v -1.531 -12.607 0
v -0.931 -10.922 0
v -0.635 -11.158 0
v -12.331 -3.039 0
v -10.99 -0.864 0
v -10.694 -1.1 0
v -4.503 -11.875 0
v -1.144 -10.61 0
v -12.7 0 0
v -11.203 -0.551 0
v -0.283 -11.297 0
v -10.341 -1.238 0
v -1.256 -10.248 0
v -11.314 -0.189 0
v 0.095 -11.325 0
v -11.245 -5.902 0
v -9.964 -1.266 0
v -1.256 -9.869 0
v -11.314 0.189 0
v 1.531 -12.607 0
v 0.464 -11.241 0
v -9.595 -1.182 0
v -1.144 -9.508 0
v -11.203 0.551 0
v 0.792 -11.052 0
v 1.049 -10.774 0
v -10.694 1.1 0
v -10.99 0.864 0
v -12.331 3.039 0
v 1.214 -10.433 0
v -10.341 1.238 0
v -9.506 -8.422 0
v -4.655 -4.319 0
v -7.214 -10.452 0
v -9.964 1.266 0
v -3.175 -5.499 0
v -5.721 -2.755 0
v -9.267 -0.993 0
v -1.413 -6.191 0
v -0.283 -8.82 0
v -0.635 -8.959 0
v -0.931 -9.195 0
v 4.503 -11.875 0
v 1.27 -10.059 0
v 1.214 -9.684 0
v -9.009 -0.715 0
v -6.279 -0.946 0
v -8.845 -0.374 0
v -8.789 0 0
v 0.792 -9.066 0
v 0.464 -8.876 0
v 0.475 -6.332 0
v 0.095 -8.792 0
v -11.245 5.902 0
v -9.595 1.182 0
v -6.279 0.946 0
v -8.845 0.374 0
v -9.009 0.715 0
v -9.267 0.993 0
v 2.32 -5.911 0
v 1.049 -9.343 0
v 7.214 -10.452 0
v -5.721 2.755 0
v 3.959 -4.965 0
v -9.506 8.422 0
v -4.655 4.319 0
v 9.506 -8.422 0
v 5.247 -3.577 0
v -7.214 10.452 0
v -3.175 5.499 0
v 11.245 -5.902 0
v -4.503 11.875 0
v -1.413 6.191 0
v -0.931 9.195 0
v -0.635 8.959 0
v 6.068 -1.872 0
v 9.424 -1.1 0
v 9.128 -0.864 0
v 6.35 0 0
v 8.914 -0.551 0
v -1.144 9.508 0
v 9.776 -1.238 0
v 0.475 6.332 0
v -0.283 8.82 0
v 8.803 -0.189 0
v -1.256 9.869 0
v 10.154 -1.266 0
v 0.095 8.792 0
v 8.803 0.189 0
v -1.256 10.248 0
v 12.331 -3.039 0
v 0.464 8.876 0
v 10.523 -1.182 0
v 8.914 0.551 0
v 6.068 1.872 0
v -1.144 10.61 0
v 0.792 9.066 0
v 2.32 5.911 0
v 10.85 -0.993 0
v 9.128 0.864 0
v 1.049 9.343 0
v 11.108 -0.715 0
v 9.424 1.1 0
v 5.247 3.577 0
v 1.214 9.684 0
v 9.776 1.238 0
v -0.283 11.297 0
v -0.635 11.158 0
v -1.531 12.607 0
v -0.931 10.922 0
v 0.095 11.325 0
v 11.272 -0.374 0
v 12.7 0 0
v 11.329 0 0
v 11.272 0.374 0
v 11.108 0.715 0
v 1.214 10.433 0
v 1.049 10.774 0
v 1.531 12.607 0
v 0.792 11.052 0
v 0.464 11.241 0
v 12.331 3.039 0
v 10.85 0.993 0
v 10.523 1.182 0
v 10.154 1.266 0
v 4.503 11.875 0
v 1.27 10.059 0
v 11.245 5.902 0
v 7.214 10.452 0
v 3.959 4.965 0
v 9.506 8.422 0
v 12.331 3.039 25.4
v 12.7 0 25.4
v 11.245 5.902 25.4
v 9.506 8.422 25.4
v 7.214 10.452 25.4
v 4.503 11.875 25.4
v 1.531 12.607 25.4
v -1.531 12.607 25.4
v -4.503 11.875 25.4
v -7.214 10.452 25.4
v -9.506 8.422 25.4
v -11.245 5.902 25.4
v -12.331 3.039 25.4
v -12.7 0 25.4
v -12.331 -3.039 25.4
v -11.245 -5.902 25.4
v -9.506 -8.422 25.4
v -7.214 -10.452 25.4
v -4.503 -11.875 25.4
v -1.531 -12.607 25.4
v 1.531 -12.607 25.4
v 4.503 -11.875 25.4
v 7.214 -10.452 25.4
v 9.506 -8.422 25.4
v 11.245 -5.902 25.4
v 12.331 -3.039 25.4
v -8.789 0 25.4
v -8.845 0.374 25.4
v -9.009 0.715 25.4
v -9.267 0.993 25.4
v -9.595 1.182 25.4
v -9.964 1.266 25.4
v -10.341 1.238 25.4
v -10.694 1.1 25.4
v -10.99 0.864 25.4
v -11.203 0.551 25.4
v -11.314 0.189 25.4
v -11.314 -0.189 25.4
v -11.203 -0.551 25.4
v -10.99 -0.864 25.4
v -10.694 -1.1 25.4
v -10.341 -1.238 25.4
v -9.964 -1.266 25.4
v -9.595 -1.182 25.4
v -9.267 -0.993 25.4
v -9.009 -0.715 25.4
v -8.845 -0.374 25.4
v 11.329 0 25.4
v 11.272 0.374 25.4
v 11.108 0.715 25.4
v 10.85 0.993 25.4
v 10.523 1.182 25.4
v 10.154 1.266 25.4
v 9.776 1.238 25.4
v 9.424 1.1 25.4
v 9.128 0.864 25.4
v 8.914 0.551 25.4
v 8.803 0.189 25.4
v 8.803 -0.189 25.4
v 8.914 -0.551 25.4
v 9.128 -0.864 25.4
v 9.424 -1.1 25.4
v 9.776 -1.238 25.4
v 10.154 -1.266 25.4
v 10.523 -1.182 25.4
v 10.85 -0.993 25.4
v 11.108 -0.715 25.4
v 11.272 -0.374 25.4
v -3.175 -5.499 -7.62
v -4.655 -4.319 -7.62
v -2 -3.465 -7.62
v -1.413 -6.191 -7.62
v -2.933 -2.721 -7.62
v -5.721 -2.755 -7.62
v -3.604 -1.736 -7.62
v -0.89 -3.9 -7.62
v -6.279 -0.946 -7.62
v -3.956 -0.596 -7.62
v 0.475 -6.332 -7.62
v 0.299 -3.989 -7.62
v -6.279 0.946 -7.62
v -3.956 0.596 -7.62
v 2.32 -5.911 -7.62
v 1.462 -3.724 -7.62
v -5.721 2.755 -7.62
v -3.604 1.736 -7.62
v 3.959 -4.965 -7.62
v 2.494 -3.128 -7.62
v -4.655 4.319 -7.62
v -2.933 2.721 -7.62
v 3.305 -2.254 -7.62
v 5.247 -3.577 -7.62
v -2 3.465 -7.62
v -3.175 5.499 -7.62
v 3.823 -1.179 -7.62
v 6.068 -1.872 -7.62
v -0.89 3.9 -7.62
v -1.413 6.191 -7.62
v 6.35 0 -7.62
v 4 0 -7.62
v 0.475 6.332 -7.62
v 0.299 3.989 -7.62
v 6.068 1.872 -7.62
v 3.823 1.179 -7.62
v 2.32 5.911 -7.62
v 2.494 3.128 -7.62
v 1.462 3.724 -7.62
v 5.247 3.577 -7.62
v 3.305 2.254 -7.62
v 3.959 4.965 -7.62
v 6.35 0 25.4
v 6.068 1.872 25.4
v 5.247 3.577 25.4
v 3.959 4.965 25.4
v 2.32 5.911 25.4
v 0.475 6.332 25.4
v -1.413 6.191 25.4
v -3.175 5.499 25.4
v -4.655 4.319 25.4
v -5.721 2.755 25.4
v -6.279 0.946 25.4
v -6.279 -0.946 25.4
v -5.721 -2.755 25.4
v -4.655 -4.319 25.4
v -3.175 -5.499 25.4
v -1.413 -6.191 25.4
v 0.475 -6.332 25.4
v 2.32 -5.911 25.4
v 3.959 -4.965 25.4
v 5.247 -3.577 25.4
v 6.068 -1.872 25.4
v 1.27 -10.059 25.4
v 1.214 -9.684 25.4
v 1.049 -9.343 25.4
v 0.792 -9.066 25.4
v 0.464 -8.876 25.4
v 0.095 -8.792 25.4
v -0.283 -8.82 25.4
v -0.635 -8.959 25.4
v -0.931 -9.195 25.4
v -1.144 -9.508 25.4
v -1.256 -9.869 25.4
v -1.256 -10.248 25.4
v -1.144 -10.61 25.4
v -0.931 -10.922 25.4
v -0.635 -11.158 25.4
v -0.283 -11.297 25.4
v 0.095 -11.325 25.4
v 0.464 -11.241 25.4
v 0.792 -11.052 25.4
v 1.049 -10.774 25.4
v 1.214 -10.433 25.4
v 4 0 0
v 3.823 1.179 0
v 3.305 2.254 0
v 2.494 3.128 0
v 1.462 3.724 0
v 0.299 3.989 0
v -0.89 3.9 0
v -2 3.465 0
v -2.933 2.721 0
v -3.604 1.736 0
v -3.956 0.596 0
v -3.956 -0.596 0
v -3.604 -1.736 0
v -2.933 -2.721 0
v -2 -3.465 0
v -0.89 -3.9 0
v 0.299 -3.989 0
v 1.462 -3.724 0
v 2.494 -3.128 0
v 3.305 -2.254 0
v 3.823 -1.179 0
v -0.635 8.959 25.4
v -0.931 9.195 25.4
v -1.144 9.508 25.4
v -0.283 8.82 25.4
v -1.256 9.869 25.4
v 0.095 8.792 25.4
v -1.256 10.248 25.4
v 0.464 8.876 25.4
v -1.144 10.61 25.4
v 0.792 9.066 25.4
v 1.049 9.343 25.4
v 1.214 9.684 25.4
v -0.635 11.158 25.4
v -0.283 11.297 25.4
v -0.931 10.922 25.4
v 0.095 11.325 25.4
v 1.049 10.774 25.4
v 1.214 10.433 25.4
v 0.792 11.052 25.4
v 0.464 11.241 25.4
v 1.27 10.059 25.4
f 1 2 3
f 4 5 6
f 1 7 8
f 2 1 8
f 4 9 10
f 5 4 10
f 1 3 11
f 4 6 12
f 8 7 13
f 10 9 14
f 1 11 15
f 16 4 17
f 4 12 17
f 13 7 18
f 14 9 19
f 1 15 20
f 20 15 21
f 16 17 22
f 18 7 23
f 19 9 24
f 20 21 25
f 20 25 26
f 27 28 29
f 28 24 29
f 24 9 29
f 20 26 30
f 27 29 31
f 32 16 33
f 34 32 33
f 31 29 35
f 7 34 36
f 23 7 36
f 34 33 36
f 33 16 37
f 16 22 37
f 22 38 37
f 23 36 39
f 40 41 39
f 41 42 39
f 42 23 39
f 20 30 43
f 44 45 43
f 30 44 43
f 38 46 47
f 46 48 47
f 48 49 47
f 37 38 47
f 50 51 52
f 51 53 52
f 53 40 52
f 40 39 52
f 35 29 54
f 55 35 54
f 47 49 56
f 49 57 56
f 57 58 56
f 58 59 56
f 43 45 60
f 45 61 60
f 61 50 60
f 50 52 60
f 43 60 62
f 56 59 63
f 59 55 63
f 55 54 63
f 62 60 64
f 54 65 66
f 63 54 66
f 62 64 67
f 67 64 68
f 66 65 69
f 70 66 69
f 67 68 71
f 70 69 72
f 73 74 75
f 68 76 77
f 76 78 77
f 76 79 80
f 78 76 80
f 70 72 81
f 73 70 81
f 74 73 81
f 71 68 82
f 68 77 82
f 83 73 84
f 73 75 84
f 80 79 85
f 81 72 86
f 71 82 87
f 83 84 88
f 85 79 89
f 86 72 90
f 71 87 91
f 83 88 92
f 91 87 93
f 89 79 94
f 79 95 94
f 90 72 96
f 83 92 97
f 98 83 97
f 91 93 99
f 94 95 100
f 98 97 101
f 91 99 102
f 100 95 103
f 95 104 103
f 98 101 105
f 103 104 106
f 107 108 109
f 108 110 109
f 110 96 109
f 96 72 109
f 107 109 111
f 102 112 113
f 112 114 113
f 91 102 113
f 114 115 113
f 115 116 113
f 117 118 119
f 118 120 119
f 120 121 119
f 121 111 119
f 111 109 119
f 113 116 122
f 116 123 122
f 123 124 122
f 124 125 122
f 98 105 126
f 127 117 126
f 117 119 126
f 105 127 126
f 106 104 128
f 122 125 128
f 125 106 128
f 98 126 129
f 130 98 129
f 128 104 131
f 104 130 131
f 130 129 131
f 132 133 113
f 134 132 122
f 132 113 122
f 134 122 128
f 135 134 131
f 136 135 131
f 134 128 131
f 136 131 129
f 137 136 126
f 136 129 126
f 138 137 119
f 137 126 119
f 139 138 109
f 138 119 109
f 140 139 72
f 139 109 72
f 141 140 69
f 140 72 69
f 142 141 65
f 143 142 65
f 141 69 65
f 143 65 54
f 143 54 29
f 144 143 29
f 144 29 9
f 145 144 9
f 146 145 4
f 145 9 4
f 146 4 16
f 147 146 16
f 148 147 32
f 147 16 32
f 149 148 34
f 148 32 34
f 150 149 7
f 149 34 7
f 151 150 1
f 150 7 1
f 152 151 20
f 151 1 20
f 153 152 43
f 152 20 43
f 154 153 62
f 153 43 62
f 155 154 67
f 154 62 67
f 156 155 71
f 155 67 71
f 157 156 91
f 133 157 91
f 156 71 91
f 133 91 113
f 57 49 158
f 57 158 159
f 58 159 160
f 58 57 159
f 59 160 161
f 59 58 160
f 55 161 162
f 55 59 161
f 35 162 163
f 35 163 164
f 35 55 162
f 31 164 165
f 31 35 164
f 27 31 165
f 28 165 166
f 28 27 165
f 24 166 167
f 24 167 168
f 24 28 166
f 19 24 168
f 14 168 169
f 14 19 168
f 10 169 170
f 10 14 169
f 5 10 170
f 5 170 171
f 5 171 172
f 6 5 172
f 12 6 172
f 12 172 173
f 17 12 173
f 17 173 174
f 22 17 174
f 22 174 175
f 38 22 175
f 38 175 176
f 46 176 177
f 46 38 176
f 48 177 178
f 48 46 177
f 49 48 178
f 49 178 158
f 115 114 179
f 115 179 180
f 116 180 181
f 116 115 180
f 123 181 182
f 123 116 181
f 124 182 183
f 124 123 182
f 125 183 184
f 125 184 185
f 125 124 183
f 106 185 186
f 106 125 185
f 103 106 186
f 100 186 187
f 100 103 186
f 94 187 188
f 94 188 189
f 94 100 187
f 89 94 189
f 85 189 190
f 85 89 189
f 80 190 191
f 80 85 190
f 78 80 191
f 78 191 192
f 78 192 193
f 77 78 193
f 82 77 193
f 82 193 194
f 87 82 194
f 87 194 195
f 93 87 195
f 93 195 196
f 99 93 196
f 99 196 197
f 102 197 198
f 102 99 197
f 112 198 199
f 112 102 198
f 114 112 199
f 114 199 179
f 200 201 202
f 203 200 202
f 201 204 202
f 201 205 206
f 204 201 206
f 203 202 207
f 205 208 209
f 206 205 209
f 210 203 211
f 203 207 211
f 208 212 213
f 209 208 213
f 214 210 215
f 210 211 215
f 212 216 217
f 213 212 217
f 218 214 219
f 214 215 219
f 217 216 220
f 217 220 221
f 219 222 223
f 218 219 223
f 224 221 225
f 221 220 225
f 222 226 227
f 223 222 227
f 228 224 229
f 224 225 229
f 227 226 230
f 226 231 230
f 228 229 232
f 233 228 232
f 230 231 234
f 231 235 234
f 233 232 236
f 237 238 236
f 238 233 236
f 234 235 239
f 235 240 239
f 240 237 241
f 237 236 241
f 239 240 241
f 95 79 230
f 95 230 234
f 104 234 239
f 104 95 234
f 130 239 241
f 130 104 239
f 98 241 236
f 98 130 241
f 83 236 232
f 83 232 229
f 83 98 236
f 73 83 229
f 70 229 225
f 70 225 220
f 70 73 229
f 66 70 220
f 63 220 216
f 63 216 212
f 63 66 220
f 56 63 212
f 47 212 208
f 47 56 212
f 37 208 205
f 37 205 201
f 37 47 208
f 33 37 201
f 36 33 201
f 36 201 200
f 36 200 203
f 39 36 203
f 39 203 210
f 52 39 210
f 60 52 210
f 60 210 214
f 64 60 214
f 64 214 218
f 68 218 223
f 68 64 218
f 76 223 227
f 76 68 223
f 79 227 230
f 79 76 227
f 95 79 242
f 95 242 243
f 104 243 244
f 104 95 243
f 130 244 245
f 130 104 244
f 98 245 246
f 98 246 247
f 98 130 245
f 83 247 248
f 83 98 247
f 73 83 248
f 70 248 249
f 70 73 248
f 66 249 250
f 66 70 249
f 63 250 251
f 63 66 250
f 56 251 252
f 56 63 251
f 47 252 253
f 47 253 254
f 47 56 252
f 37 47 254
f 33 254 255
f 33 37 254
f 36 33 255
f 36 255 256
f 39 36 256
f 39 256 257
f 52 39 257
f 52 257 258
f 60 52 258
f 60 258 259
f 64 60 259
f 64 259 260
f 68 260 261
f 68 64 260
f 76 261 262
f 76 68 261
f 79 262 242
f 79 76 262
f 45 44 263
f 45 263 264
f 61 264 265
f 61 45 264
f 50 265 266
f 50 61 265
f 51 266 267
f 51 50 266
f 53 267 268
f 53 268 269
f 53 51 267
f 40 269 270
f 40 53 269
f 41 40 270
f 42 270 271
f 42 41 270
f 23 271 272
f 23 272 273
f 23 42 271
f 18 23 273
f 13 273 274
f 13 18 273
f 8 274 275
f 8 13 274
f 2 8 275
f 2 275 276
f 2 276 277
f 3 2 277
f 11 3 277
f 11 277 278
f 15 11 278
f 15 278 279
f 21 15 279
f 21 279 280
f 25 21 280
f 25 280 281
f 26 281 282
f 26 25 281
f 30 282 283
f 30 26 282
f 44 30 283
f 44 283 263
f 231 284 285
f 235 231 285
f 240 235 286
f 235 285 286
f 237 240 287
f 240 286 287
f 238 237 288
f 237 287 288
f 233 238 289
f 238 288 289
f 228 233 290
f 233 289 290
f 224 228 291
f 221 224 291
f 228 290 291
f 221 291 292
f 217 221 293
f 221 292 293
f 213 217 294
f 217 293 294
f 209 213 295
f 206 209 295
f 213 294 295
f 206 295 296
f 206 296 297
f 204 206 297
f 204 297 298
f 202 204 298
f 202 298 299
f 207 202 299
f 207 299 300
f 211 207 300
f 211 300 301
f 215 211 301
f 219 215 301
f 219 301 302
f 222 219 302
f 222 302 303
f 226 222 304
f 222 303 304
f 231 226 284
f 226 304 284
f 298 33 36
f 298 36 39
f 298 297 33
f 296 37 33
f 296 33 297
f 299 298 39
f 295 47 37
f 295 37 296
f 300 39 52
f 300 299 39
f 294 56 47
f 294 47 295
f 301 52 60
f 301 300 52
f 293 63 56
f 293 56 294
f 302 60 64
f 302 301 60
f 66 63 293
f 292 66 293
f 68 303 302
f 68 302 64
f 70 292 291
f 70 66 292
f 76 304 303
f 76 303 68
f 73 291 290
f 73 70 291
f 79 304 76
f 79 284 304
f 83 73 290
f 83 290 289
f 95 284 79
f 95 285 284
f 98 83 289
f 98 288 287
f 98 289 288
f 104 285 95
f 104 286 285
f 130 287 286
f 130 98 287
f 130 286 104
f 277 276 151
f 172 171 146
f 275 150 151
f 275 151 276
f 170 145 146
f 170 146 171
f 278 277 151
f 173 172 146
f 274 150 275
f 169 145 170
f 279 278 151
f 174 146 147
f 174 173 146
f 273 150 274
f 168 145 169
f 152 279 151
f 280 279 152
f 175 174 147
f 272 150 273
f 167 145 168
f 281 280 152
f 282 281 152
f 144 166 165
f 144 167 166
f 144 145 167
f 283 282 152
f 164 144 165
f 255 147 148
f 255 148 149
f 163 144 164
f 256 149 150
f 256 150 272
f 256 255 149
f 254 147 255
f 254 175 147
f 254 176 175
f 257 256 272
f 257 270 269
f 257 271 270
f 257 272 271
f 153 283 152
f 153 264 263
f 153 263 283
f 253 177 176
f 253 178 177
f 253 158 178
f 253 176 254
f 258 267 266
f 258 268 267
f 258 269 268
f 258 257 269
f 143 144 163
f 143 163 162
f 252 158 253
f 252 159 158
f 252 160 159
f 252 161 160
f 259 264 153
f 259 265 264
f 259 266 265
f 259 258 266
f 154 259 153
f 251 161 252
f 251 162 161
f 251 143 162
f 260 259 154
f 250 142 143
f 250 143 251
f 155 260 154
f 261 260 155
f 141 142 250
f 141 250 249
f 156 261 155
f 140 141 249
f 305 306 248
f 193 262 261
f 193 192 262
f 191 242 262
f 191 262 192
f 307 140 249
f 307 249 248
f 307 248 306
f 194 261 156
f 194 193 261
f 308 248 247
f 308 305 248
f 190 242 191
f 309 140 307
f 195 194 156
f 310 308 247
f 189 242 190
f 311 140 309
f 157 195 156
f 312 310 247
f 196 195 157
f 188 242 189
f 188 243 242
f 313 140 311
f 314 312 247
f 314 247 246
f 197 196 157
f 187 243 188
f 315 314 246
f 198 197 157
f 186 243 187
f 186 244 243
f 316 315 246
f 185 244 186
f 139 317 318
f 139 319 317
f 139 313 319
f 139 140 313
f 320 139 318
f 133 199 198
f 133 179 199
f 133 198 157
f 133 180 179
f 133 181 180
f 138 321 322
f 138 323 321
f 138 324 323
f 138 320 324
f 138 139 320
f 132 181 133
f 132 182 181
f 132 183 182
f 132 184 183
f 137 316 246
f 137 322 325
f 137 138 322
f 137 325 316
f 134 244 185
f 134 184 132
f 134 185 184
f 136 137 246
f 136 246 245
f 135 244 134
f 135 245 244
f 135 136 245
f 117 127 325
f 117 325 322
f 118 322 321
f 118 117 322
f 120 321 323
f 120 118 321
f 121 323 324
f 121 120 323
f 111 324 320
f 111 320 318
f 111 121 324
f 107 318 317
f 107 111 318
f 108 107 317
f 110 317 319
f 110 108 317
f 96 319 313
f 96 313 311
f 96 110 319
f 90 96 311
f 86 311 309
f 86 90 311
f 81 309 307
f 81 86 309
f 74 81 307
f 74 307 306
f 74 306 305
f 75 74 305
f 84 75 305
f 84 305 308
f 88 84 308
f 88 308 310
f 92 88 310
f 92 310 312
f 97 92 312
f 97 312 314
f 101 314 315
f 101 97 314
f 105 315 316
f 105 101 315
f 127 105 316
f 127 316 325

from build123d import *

# Parameters (mm, degrees)
F0_R     = 12.7
F0_R_2   = 1.27
F0_R_3   = 6.35
F1_DEPTH = 25.4
F0_R_4   = 4.0005
F2_DEPTH = 7.62


with BuildPart() as f1:
    # F0 (on Top) → F1 (new body)
    with BuildSketch(Plane.XY):
        Circle(F0_R)
        with Locations((0, -10.05864)):
            Circle(F0_R_2, mode=Mode.SUBTRACT)
        with Locations((-10.05864, 0)):
            Circle(F0_R_2, mode=Mode.SUBTRACT)
        Circle(F0_R_3, mode=Mode.SUBTRACT)
        with Locations((10.05864, 0)):
            Circle(F0_R_2, mode=Mode.SUBTRACT)
        with Locations((0, 10.05864)):
            Circle(F0_R_2, mode=Mode.SUBTRACT)
    extrude(amount=F1_DEPTH)

    # F0 (on Top) → F2 (join)
    with BuildSketch(Plane.XY):
        Circle(F0_R_3)
        Circle(F0_R_4, mode=Mode.SUBTRACT)
    extrude(amount=-F2_DEPTH)


solid = f1.part
